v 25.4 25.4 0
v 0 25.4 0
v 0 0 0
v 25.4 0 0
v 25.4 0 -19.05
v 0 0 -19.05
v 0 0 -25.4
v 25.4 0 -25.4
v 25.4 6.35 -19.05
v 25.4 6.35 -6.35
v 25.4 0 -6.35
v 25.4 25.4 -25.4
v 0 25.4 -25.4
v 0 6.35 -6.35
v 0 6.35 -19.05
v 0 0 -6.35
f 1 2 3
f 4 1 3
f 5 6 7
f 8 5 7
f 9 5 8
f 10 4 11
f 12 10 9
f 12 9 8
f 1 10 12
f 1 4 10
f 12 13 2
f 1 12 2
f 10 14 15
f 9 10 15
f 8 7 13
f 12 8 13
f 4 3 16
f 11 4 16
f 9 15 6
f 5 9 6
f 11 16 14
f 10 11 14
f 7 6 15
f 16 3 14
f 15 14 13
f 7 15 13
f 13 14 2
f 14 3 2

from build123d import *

# Parameters (mm, degrees)
F1_DEPTH = 25.4


with BuildPart() as f1:
    # F0 (on Right) → F1 (new body)
    with BuildSketch(Plane.YZ):
        Polygon((25.4, 0), (0, 0), (0, -2.695372), (0, -6.35), (6.35, -6.35), (6.35, -19.05), (0, -19.05), (0, -25.4), (25.4, -25.4), align=None)
    extrude(amount=F1_DEPTH)


solid = f1.part
